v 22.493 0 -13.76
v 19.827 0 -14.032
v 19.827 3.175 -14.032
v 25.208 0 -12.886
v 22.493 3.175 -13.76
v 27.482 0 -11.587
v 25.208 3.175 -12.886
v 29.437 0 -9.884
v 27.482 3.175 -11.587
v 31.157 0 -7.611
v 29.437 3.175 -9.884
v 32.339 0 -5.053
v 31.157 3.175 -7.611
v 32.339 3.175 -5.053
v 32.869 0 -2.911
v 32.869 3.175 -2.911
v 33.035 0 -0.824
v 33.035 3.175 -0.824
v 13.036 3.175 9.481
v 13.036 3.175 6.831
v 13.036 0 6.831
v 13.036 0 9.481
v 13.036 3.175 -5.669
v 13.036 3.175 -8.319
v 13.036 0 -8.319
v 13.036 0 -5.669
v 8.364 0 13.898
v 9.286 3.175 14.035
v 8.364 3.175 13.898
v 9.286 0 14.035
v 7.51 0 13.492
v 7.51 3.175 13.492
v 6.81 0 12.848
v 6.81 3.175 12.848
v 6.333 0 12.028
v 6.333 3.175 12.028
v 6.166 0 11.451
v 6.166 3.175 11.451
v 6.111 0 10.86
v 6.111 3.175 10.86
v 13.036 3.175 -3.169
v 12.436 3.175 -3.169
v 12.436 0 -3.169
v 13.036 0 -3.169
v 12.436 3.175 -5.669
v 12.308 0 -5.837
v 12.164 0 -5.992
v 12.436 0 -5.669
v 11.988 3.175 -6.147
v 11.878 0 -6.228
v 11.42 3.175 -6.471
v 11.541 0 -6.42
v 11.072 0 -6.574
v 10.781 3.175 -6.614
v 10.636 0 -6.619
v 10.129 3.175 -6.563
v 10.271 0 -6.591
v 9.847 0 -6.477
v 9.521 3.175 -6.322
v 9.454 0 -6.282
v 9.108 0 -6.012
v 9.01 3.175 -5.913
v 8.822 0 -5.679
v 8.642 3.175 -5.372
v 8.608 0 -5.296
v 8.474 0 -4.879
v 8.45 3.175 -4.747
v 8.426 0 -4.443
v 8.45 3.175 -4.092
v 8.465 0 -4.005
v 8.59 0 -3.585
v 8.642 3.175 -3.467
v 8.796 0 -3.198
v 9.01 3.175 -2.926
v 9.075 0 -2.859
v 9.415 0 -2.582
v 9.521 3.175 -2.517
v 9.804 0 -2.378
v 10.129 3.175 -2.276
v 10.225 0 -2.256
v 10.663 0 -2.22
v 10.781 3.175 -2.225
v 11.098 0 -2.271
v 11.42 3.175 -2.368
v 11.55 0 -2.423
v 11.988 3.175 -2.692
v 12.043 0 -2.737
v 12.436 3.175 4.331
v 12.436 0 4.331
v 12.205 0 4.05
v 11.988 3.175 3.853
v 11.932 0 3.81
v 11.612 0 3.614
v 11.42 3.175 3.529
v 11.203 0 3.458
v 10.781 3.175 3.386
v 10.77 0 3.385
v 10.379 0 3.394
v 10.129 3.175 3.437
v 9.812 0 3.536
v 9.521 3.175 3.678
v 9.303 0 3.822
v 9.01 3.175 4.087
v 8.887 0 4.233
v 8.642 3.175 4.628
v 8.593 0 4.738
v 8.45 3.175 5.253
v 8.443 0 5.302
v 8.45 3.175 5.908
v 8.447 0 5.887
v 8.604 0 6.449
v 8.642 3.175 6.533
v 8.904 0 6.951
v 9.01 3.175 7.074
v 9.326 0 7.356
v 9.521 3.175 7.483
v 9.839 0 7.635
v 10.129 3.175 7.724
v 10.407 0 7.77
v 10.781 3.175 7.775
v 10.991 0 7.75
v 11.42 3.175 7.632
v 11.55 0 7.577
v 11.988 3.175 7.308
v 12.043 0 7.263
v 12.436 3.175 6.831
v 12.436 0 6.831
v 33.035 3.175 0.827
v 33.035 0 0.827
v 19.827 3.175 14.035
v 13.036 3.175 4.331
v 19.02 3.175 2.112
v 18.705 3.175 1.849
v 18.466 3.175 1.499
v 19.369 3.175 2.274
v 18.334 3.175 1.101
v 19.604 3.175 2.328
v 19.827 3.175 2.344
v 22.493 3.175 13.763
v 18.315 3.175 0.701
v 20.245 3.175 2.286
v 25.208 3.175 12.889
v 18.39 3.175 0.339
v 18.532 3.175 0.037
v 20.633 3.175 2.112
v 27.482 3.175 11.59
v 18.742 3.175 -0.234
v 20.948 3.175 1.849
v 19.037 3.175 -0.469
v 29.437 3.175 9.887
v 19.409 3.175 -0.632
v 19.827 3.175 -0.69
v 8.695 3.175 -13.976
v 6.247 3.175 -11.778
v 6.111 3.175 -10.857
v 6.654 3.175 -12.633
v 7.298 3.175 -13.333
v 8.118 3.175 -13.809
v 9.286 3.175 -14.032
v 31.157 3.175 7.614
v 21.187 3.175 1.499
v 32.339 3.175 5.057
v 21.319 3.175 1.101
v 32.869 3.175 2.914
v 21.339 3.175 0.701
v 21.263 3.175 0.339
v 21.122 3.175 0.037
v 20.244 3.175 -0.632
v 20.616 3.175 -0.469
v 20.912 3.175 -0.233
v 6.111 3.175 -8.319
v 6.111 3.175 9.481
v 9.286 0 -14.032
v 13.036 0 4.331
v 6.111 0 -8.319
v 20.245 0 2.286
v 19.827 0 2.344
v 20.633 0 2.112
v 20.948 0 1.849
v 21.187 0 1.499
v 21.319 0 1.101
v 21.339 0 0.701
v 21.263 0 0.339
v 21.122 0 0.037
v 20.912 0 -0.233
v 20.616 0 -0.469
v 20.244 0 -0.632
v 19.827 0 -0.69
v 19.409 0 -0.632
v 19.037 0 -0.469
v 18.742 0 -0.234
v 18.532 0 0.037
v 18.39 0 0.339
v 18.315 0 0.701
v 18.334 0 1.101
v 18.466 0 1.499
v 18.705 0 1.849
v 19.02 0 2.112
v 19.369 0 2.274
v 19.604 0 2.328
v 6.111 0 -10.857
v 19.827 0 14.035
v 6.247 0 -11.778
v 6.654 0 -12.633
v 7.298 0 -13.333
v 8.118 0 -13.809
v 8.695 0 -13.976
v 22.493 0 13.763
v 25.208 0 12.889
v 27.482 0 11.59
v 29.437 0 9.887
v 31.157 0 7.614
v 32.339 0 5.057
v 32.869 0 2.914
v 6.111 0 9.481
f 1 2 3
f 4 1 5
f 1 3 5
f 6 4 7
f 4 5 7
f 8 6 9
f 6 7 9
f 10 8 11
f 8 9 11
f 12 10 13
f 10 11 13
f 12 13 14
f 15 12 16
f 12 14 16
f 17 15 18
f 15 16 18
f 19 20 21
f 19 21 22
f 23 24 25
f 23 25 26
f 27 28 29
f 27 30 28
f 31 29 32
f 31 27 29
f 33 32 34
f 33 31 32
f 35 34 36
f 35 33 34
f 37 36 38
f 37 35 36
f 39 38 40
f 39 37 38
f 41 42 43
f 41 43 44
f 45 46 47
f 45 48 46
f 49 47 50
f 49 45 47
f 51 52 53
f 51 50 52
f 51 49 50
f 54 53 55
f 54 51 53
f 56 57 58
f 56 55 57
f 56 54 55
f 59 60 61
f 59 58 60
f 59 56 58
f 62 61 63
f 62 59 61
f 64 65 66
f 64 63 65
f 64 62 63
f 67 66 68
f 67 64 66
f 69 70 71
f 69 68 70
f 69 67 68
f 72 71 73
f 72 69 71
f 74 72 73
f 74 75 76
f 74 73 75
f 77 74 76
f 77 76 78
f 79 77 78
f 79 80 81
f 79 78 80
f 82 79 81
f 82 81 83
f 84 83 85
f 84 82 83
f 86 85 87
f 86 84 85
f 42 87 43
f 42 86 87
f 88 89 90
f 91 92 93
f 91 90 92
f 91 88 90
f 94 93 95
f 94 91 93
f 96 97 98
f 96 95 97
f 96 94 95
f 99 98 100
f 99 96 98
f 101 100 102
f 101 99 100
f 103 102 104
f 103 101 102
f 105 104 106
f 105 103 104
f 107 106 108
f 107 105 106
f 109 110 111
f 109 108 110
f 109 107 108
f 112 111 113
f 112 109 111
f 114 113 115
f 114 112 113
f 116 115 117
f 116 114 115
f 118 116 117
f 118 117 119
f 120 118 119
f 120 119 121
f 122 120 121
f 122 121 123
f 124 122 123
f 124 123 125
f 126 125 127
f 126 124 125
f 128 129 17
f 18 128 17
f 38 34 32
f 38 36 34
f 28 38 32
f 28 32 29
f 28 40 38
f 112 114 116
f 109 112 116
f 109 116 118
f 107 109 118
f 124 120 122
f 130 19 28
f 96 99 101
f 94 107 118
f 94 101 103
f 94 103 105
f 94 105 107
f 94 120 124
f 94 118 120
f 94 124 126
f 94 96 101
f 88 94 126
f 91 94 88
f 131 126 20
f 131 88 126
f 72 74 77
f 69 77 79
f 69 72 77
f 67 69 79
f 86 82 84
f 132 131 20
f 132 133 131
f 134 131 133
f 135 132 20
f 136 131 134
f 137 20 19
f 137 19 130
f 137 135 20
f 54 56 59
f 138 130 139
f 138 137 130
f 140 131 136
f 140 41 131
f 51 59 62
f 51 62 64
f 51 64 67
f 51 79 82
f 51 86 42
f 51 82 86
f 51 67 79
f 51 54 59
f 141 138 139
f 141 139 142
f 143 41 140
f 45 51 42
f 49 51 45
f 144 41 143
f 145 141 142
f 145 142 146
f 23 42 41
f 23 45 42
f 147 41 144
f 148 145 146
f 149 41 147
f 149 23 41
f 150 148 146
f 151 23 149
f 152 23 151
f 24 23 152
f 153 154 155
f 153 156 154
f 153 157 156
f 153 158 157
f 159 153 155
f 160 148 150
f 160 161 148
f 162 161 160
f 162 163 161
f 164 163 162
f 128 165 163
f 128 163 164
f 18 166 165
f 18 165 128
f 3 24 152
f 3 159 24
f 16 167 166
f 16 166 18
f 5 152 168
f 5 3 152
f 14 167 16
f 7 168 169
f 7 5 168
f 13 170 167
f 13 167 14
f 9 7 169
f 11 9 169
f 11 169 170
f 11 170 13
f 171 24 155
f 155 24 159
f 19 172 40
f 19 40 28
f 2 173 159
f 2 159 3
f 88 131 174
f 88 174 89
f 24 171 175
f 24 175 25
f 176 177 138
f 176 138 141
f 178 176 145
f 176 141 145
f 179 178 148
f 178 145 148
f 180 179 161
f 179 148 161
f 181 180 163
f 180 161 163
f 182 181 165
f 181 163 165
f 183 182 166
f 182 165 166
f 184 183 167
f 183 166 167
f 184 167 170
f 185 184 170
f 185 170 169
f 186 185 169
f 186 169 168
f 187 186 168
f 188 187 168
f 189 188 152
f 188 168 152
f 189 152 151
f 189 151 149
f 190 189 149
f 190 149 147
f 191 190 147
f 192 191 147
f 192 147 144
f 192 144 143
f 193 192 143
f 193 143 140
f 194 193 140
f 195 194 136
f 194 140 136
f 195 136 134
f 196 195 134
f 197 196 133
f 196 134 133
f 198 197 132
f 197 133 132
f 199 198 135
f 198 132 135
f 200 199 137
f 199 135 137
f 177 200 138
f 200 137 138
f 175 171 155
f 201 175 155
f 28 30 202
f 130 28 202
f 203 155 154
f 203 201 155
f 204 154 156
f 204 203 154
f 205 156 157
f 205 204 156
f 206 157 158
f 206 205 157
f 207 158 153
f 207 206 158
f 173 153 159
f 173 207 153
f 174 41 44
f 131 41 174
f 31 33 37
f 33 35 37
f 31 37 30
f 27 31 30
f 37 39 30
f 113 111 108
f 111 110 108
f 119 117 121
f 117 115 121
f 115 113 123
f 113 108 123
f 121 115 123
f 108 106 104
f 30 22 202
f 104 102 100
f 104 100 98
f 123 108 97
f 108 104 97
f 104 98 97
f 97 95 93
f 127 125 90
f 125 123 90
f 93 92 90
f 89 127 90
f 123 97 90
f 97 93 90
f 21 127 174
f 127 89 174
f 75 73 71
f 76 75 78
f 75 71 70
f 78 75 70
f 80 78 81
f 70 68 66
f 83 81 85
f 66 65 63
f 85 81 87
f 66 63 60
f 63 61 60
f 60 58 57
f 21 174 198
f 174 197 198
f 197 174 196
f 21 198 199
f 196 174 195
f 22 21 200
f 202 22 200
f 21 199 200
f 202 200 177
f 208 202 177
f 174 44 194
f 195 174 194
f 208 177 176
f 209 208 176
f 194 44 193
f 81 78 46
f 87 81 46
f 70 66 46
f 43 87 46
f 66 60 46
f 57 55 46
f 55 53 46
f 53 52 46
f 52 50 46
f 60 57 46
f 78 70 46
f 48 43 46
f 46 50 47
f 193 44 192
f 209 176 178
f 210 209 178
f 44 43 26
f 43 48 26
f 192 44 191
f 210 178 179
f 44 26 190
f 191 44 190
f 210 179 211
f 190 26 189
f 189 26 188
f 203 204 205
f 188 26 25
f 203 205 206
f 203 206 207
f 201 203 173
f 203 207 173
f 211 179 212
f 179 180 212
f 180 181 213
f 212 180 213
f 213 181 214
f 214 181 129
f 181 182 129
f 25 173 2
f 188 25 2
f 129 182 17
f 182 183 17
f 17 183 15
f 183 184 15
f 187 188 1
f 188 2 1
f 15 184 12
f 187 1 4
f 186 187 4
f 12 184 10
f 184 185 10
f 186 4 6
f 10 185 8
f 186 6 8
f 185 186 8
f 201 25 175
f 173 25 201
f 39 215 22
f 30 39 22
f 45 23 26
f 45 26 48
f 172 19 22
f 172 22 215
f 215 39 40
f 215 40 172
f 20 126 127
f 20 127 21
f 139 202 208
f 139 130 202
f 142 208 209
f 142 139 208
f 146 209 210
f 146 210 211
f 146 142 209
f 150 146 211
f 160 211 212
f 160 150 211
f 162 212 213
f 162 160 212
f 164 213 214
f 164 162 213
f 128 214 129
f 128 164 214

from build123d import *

# Parameters (mm, degrees)
SKETCH1_W           = 50.8
SKETCH1_H           = 21.59
BOSS_EXTRUDE1_DEPTH = 3.175
FILLET1_R           = 10.16
SKETCH3_R           = 1.16713
CUT_EXTRUDE1_DEPTH  = 28.780796425
FILLET3_R           = 10.16
SCALE1_SCALE_X      = 1.3
SCALE1_SCALE_Y      = 1
SCALE1_SCALE_Z      = 1.3
SKETCH4_W           = 39.116
SKETCH4_H           = 28.067
CUT_EXTRUDE2_DEPTH  = 37.032702199
CUT_EXTRUDE3_DEPTH  = 37.032702199
FILLET5_R           = 3.175


with BuildPart() as part:
    # Sketch1 → Boss-Extrude1 (new body)
    with BuildSketch(Plane(origin=(0, 0, 0), x_dir=(1, 0, 0), z_dir=(0, 1, 0))):
        Rectangle(SKETCH1_W, SKETCH1_H)
    extrude(amount=BOSS_EXTRUDE1_DEPTH)

    # Fillet1
    fillet1_edges = [part.edges().sort_by_distance(p)[0] for p in [
        (25.4, 1.5875, 10.795),
        (-25.4, 1.5875, 10.795),
    ]]
    fillet(fillet1_edges, radius=FILLET1_R)

    # Sketch3 → Cut-Extrude1 (cut, through all)
    with BuildSketch(Plane(origin=(0, 3.175, 0), x_dir=(1, 0, 0), z_dir=(0, 1, 0))):
        with Locations(Location((15.24, -0.635, 0), (0, 0, 270))):
            Circle(SKETCH3_R)
        with Locations(Location((-3.81, -0.635, 0), (0, 0, 270))):
            Circle(SKETCH3_R)
    extrude(amount=-CUT_EXTRUDE1_DEPTH, mode=Mode.SUBTRACT)

    # Fillet3
    fillet3_edges = [part.edges().sort_by_distance(p)[0] for p in [
        (-25.4, 1.5875, -10.795),
        (25.4, 1.5875, -10.795),
    ]]
    fillet(fillet3_edges, radius=FILLET3_R)


with BuildPart() as part_1:
    # Scale1: scaled about (-0.04893356, 1.5875, -0.005437062)
    add(part.part.scale((SCALE1_SCALE_X, SCALE1_SCALE_Y, SCALE1_SCALE_Z), about=(-0.04893356, 1.5875, -0.005437062)))

    # Sketch4 → Cut-Extrude2 (cut, through all)
    with BuildSketch(Plane(origin=(0, 3.175, 0), x_dir=(1, 0, 0), z_dir=(0, 1, 0))):
        with Locations((-13.447319932, -0.001631119)):
            Rectangle(SKETCH4_W, SKETCH4_H)
    extrude(amount=-CUT_EXTRUDE2_DEPTH, mode=Mode.SUBTRACT)

    # Sketch5 → Cut-Extrude3 (cut, through all)
    with BuildSketch(Plane(origin=(0, 3.175, 0), x_dir=(1, 0, 0), z_dir=(0, 1, 0))):
        with BuildLine():
            Line((13.035792068, -6.830615627), (13.035792068, -9.480615627))
            Line((13.035792068, -9.480615627), (6.110680068, -9.480615627))
            Line((6.110680068, -9.480615627), (6.110680068, 8.319384373))
            Line((6.110680068, 8.319384373), (13.035792068, 8.319384373))
            Line((13.035792068, 8.319384373), (13.035792068, 5.669384373))
            Line((13.035792068, 5.669384373), (12.435792068, 5.669384373))
            ThreePointArc((12.435792068, 5.669384373), (8.425405369, 4.419384373), (12.435792068, 3.169384373))
            Line((12.435792068, 3.169384373), (13.035792068, 3.169384373))
            Line((13.035792068, 3.169384373), (13.035792068, -4.330615627))
            Line((13.035792068, -4.330615627), (12.435792068, -4.330615627))
            ThreePointArc((12.435792068, -4.330615627), (8.425405369, -5.580615627), (12.435792068, -6.830615627))
            Line((12.435792068, -6.830615627), (13.035792068, -6.830615627))
        make_face()
    extrude(amount=-CUT_EXTRUDE3_DEPTH, mode=Mode.SUBTRACT)

    # Fillet5
    fillet5_edges = [part_1.edges().sort_by_distance(p)[0] for p in [
        (6.110680068, 1.5875, -14.031868881),
        (6.110680068, 1.5875, 14.035131119),
    ]]
    fillet(fillet5_edges, radius=FILLET5_R)


solid = part_1.part
